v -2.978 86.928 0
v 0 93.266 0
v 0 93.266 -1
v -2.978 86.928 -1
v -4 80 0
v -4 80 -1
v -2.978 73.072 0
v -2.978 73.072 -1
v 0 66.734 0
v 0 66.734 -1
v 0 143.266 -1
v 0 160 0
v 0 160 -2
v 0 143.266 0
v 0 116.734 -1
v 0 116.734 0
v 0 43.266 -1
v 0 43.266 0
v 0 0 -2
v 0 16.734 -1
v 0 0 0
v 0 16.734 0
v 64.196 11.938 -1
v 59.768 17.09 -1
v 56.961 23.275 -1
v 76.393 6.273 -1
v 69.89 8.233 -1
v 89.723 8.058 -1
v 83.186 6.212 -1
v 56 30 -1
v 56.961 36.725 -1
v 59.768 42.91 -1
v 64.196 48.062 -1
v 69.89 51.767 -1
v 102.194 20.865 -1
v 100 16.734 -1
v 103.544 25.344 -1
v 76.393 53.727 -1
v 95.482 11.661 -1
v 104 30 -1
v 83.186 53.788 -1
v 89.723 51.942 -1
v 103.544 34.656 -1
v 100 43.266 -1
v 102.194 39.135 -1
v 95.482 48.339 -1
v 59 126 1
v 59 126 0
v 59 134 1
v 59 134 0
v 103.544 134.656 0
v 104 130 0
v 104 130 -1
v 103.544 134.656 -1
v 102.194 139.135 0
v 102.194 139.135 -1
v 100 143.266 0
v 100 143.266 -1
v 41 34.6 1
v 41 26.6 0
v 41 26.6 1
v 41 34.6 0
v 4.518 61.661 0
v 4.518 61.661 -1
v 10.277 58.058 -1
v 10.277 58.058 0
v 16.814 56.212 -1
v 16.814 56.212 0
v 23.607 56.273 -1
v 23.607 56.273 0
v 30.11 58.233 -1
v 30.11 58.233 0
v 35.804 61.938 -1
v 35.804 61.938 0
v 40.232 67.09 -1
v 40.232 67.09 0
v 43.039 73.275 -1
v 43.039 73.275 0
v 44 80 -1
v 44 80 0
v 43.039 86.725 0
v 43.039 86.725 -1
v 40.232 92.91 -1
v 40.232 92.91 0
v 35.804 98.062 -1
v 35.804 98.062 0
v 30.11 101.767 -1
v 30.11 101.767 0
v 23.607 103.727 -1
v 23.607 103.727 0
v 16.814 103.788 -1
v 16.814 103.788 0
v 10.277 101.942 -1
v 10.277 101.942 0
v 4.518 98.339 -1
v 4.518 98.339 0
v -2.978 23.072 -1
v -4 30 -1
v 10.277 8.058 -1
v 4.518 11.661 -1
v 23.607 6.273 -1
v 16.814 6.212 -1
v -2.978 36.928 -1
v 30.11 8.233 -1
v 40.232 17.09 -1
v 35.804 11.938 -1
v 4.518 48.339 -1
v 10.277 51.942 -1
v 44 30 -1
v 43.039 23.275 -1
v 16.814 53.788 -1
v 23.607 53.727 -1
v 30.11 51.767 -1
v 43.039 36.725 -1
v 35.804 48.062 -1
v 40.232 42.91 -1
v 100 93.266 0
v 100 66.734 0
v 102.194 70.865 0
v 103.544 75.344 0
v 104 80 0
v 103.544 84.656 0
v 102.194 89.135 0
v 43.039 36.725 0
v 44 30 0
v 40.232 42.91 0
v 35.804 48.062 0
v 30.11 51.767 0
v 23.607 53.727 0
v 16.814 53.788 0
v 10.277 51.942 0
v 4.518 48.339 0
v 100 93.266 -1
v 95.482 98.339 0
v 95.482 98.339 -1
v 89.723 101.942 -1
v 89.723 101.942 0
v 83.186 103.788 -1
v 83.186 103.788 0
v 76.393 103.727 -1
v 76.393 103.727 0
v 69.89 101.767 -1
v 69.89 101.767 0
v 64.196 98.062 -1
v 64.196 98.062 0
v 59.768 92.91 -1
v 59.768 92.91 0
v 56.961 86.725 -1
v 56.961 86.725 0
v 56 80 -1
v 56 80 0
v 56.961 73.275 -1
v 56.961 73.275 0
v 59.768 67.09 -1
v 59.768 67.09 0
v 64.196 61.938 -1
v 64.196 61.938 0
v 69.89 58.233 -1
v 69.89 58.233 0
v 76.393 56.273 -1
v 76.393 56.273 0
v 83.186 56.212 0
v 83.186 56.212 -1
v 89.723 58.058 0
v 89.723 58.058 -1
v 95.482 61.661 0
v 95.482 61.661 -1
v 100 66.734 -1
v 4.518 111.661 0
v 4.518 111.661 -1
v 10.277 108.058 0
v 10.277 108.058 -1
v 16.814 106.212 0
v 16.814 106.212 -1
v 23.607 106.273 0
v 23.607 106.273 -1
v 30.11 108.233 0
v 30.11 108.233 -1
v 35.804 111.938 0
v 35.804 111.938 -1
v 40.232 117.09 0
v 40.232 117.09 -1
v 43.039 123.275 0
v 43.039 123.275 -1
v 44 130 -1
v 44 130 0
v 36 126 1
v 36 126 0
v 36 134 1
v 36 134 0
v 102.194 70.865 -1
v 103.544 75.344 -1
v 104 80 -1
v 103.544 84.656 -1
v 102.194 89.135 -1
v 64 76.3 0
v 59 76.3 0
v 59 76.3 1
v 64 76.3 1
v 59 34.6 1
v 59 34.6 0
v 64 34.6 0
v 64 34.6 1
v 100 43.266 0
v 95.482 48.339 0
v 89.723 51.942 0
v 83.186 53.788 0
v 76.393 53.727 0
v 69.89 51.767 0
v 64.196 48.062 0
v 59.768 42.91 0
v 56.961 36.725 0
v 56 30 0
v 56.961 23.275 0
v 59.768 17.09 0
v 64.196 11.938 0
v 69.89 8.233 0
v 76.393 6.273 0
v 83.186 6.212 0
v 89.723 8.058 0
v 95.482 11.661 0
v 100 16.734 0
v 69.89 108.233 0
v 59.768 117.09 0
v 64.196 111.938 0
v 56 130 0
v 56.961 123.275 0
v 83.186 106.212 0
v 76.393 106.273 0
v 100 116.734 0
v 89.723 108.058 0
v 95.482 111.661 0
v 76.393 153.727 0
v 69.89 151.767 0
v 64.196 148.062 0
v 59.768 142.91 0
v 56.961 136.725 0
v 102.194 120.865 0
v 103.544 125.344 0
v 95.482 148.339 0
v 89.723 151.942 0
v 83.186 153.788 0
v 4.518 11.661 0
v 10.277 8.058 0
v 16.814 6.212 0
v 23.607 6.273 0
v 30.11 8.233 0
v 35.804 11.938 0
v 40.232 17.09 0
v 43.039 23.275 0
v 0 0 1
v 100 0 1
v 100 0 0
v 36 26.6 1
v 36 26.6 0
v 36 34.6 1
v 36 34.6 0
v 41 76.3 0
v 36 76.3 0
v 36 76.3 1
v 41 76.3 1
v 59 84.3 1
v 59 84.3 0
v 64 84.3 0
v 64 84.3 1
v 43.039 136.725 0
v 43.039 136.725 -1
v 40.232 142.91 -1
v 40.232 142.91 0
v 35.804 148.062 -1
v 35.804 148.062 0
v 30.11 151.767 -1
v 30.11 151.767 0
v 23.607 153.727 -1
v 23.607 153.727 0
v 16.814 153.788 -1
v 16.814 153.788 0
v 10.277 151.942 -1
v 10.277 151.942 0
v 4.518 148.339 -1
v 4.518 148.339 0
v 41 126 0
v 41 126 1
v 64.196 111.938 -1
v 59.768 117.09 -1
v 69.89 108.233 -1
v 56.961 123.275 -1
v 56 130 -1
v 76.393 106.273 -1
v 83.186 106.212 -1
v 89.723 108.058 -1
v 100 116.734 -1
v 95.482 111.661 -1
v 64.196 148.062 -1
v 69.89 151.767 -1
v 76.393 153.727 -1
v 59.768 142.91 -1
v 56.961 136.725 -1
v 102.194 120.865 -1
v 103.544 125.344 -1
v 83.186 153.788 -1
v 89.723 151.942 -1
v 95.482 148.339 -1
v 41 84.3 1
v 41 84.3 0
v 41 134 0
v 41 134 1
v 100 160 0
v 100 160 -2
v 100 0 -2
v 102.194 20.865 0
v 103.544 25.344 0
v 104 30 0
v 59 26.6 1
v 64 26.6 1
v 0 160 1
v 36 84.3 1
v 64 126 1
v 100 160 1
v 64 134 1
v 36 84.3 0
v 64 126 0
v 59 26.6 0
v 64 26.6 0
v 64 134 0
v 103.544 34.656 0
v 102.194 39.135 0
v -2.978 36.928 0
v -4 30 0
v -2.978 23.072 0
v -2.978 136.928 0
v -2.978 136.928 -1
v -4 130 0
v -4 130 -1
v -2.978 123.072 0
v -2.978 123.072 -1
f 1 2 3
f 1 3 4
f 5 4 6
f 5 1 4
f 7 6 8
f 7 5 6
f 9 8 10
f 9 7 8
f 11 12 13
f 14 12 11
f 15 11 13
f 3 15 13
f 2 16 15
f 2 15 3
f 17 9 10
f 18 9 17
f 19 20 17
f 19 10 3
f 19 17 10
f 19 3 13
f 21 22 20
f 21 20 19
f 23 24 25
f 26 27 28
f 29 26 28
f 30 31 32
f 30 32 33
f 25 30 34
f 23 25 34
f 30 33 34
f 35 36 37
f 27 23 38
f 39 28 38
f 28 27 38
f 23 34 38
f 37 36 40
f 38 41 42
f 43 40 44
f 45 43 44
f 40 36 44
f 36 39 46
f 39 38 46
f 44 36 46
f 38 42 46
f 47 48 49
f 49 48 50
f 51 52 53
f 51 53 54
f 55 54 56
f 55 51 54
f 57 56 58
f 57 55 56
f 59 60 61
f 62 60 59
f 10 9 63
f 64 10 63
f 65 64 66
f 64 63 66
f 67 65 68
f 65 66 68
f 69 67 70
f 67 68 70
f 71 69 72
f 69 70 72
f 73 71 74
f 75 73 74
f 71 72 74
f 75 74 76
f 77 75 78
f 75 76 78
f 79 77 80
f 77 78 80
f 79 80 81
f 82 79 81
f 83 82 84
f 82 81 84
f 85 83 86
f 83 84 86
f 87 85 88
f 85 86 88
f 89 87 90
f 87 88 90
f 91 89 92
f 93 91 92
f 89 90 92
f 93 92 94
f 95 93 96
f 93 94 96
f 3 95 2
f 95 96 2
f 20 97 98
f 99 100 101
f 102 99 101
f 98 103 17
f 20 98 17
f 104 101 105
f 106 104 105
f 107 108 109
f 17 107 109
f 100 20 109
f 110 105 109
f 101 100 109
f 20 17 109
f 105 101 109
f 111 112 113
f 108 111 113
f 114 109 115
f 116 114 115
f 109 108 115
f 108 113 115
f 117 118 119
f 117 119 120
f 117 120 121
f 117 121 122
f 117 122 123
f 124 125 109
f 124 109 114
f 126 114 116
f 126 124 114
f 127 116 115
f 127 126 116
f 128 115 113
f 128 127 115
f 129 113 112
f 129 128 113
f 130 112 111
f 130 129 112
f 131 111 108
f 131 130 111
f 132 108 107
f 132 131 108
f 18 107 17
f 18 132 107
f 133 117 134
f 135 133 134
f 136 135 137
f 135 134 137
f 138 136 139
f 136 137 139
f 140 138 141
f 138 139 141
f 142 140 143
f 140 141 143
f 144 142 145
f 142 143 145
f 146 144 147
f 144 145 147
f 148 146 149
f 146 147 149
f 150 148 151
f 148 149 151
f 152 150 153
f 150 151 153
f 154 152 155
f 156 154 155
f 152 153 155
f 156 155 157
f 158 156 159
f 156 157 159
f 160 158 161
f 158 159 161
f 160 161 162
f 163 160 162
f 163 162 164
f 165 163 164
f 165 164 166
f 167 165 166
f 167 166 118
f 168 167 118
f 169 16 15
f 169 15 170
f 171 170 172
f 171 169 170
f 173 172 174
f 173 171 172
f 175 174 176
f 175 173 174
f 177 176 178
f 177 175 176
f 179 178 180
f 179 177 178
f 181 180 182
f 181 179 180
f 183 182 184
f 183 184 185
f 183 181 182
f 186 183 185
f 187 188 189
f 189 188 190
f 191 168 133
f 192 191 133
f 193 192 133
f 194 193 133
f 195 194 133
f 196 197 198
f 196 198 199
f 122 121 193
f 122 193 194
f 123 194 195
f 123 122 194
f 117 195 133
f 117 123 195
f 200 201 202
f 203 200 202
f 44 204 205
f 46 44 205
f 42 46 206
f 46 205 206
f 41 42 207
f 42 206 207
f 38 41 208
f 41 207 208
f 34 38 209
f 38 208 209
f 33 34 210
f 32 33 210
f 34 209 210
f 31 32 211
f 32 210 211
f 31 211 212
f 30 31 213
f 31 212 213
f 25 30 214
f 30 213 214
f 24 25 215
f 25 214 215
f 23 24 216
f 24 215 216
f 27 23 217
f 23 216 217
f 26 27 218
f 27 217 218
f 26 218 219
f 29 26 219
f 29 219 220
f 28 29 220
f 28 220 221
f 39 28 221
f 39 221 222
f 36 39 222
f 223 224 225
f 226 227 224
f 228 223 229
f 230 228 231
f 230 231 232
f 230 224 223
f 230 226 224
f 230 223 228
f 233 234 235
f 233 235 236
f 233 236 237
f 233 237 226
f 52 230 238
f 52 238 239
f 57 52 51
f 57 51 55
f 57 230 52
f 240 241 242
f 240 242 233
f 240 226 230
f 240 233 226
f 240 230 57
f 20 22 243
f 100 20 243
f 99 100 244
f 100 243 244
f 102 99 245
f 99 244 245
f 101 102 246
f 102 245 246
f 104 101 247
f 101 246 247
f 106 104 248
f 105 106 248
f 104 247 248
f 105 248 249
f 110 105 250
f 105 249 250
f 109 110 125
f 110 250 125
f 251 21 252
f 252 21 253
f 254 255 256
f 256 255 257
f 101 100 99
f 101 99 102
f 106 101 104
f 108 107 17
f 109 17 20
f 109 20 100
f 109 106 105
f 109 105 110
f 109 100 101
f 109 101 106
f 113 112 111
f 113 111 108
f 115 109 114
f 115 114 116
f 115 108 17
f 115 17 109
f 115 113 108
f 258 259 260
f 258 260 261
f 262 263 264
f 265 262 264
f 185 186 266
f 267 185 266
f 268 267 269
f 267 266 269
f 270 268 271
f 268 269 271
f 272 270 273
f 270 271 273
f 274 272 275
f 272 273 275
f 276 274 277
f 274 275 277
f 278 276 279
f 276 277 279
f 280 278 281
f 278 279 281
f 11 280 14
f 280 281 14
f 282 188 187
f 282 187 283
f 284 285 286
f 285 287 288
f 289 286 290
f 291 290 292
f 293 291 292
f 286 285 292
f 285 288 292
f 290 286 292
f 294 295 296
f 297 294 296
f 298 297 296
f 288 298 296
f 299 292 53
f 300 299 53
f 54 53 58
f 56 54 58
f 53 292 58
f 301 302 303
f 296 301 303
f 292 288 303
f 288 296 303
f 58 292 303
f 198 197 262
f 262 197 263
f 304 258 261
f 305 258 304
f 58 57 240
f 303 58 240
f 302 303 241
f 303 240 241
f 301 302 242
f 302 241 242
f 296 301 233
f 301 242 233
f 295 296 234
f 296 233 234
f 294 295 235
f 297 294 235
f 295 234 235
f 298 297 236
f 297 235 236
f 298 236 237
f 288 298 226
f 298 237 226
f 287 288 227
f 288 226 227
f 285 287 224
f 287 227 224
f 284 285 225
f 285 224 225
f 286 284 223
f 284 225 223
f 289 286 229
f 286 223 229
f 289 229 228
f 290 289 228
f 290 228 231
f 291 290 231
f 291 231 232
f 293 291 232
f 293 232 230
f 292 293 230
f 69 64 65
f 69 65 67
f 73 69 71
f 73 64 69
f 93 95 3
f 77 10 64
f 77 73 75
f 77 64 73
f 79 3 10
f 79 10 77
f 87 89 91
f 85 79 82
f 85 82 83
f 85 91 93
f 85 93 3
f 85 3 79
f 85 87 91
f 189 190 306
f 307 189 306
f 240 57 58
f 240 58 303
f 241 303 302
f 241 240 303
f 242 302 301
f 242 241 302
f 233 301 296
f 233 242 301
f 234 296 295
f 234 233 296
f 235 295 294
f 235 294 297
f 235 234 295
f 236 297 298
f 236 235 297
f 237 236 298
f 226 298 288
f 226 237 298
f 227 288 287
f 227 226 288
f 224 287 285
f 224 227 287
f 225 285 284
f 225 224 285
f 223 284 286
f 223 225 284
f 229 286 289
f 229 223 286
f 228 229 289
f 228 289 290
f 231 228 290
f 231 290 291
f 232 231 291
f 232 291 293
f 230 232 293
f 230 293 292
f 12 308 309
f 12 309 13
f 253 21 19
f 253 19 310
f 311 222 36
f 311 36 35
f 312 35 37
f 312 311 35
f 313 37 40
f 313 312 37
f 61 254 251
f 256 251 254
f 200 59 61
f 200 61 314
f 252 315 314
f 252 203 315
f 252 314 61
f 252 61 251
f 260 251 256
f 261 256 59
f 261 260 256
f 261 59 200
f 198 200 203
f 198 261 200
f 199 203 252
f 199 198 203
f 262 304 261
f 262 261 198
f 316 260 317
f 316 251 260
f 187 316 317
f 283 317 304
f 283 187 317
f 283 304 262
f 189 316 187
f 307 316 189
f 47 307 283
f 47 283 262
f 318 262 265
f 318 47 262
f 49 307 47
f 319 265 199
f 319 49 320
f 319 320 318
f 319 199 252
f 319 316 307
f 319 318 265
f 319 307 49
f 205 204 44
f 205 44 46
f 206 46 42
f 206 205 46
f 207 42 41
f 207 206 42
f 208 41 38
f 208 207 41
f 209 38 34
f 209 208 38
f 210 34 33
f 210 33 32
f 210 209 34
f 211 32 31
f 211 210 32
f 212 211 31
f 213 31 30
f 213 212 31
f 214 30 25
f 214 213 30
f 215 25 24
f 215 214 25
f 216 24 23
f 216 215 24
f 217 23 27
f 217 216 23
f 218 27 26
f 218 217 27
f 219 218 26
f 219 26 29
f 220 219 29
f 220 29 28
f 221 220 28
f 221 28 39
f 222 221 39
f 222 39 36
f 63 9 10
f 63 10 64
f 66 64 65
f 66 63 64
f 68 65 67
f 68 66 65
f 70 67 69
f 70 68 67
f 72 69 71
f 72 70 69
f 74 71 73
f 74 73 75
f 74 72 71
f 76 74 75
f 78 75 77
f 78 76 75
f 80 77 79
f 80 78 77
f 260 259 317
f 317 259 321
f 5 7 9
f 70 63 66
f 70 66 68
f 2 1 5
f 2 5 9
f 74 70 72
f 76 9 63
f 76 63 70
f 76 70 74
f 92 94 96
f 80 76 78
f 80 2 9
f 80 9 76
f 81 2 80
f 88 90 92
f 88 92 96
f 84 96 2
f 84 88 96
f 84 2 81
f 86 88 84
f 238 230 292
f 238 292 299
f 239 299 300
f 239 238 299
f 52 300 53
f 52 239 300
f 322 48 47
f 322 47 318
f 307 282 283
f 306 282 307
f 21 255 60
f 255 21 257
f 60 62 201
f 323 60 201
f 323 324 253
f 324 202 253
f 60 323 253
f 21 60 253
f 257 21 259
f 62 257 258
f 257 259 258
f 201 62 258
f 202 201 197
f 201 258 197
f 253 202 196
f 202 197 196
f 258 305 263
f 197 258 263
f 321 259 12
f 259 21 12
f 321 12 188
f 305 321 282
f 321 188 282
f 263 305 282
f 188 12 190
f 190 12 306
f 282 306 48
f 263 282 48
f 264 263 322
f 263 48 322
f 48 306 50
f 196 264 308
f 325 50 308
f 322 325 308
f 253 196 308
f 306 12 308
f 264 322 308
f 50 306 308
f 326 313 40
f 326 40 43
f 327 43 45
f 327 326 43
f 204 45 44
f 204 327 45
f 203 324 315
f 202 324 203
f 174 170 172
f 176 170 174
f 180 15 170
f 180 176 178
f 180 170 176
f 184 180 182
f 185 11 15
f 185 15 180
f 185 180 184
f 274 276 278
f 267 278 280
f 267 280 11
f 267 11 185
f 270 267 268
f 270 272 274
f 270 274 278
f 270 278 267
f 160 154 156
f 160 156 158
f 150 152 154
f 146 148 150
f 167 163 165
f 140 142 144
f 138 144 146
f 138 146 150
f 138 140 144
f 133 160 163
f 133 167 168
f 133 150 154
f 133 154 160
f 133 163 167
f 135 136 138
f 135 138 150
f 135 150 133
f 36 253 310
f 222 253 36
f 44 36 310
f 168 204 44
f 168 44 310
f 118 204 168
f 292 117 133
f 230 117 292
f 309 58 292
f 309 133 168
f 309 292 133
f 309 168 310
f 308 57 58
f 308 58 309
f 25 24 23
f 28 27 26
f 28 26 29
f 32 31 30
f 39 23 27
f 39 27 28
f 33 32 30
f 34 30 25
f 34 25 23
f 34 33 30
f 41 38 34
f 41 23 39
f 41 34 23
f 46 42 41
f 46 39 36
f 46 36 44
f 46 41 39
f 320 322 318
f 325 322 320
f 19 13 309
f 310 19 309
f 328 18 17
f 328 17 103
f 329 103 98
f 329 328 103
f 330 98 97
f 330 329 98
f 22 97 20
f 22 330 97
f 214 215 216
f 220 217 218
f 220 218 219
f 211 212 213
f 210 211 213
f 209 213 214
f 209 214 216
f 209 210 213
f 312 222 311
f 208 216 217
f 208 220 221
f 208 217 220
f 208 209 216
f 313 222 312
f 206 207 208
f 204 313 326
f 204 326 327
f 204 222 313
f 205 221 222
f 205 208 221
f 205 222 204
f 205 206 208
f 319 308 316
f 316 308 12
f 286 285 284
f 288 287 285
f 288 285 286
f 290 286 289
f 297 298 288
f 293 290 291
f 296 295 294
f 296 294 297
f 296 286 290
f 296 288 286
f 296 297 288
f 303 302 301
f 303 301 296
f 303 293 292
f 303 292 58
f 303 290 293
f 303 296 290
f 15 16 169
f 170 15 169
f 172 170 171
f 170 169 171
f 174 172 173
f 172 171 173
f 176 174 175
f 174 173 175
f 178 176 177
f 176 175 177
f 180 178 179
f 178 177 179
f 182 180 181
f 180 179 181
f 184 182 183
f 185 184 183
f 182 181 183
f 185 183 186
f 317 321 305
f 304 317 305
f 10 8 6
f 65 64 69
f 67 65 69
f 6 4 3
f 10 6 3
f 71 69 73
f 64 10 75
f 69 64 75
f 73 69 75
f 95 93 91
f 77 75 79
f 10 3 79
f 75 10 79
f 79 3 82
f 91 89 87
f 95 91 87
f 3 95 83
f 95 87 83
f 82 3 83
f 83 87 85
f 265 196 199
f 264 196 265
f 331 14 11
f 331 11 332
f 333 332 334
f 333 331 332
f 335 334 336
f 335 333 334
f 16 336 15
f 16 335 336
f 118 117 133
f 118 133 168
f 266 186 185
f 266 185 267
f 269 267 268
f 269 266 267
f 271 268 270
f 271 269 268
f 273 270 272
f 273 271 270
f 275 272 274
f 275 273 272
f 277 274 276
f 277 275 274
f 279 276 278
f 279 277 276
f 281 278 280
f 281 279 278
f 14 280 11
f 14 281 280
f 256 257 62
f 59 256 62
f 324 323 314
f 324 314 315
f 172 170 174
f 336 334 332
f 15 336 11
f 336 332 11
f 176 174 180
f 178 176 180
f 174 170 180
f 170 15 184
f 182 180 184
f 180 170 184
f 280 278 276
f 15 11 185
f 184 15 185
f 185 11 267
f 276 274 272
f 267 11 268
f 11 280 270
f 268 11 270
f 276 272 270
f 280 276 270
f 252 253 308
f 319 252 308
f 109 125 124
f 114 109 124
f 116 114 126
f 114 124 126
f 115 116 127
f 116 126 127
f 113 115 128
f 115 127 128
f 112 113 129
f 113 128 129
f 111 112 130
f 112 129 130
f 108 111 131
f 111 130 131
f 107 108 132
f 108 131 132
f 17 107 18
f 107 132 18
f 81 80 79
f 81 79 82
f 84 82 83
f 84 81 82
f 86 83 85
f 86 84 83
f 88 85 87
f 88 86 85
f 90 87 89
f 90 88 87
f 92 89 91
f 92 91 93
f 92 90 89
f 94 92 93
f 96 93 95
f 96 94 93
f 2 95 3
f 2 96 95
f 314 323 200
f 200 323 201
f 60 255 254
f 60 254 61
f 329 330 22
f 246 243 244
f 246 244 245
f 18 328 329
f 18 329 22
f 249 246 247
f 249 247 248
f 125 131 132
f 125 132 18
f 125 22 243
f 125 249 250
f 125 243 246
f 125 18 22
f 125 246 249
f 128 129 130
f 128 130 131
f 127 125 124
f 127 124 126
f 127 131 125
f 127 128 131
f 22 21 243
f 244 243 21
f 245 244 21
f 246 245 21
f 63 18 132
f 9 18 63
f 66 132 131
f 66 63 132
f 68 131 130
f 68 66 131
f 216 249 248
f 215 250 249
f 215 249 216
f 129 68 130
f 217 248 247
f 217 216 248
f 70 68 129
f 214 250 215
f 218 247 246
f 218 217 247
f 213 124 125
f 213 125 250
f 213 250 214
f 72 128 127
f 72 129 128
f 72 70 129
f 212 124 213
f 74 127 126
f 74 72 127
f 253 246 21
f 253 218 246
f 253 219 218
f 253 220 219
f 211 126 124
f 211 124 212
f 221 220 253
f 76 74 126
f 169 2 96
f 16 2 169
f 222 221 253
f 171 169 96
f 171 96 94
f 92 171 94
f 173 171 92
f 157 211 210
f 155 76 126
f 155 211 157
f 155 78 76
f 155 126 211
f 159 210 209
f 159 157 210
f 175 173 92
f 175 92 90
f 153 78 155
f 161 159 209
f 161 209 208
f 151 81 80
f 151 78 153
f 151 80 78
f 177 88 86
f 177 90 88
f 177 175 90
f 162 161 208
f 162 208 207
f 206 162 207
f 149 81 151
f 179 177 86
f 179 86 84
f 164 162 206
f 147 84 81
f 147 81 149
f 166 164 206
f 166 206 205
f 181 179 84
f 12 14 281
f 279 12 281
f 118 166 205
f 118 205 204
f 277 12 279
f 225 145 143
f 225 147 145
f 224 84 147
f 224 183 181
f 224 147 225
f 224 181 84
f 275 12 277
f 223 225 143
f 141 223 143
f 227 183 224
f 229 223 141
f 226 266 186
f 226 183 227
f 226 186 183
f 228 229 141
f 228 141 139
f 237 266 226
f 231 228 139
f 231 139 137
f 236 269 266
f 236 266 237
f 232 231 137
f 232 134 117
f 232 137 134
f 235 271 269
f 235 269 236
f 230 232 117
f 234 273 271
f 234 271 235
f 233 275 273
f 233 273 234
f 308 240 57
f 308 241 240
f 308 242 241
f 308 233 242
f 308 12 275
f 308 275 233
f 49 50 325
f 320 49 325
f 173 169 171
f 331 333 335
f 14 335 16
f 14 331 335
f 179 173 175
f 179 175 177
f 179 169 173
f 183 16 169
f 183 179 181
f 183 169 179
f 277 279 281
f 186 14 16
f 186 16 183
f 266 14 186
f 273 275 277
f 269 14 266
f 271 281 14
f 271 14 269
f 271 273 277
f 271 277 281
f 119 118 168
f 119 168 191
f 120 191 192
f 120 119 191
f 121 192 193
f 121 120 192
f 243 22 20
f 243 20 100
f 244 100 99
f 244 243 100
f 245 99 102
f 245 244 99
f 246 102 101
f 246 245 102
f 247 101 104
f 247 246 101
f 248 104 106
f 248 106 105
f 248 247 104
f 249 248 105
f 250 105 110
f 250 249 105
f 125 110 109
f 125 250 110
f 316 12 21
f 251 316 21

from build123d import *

# Parameters (mm, degrees)
F0_W     = 5
F0_H     = 8
F1_DEPTH = 2
F2_DEPTH = 1
F3_DEPTH = 1
F4_DEPTH = 1


with BuildPart() as f1:
    # F0 (on Top) → F1 (new body)
    with BuildSketch(Plane.XY):
        with BuildLine():
            ThreePointArc((100, 143.2664991614), (56, 130), (100, 116.7335008386))
            Line((100, 116.7335008386), (100, 143.2664991614))
        make_face()
        with Locations((61.5, 130)):
            Rectangle(F0_W, F0_H, mode=Mode.SUBTRACT)
        with BuildLine():
            Line((0, 16.7335008386), (0, 0))
            Line((0, 0), (100, 0))
            Line((100, 0), (100, 16.7335008386))
            ThreePointArc((100, 16.7335008386), (56, 30), (100, 43.2664991614))
            Line((100, 43.2664991614), (100, 66.7335008386))
            ThreePointArc((100, 66.7335008386), (56, 80), (100, 93.2664991614))
            Line((100, 93.2664991614), (100, 116.7335008386))
            ThreePointArc((100, 116.7335008386), (56, 130), (100, 143.2664991614))
            Line((100, 143.2664991614), (100, 160))
            Line((100, 160), (0, 160))
            Line((0, 160), (0, 143.2664991614))
            ThreePointArc((0, 143.2664991614), (26.9282032303, 152.9782505862), (44, 130))
            ThreePointArc((44, 130), (26.9282032303, 107.0217494138), (0, 116.7335008386))
            Line((0, 116.7335008386), (0, 93.2664991614))
            ThreePointArc((0, 93.2664991614), (26.9282032303, 102.9782505862), (44, 80))
            ThreePointArc((44, 80), (26.9282032303, 57.0217494138), (0, 66.7335008386))
            Line((0, 66.7335008386), (0, 43.2664991614))
            ThreePointArc((0, 43.2664991614), (26.9282032303, 52.9782505862), (44, 30))
            ThreePointArc((44, 30), (26.9282032303, 7.0217494138), (0, 16.7335008386))
        make_face()
        with BuildLine():
            ThreePointArc((100, 43.2664991614), (56, 30), (100, 16.7335008386))
            Line((100, 16.7335008386), (100, 43.2664991614))
        make_face()
        with Locations((61.5, 30.6)):
            Rectangle(F0_W, F0_H, mode=Mode.SUBTRACT)
        with BuildLine():
            Line((0, 93.2664991614), (0, 66.7335008386))
            ThreePointArc((0, 66.7335008386), (26.9282032303, 57.0217494138), (44, 80))
            ThreePointArc((44, 80), (26.9282032303, 102.9782505862), (0, 93.2664991614))
        make_face()
        with Locations((38.5, 80.3)):
            Rectangle(F0_W, F0_H, mode=Mode.SUBTRACT)
        with BuildLine():
            ThreePointArc((100, 93.2664991614), (56, 80), (100, 66.7335008386))
            Line((100, 66.7335008386), (100, 93.2664991614))
        make_face()
        with Locations((61.5, 80.3)):
            Rectangle(F0_W, F0_H, mode=Mode.SUBTRACT)
        with BuildLine():
            Line((0, 43.2664991614), (0, 16.7335008386))
            ThreePointArc((0, 16.7335008386), (26.9282032303, 7.0217494138), (44, 30))
            ThreePointArc((44, 30), (26.9282032303, 52.9782505862), (0, 43.2664991614))
        make_face()
        with Locations((38.5, 30.6)):
            Rectangle(F0_W, F0_H, mode=Mode.SUBTRACT)
        with BuildLine():
            Line((0, 143.2664991614), (0, 116.7335008386))
            ThreePointArc((0, 116.7335008386), (26.9282032303, 107.0217494138), (44, 130))
            ThreePointArc((44, 130), (26.9282032303, 152.9782505862), (0, 143.2664991614))
        make_face()
        with Locations((38.5, 130)):
            Rectangle(F0_W, F0_H, mode=Mode.SUBTRACT)
        with Locations((38.5, 80.3)):
            Rectangle(F0_W, F0_H)
        with Locations((38.5, 130)):
            Rectangle(F0_W, F0_H)
        with Locations((61.5, 130)):
            Rectangle(F0_W, F0_H)
        with Locations((61.5, 80.3)):
            Rectangle(F0_W, F0_H)
        with Locations((38.5, 30.6)):
            Rectangle(F0_W, F0_H)
        with Locations((61.5, 30.6)):
            Rectangle(F0_W, F0_H)
    extrude(amount=-F1_DEPTH)

    # F0 (on Top) → F2 (cut)
    with BuildSketch(Plane.XY):
        with BuildLine():
            Line((0, 143.2664991614), (0, 116.7335008386))
            ThreePointArc((0, 116.7335008386), (26.9282032303, 107.0217494138), (44, 130))
            ThreePointArc((44, 130), (26.9282032303, 152.9782505862), (0, 143.2664991614))
        make_face()
        with Locations((38.5, 130)):
            Rectangle(F0_W, F0_H, mode=Mode.SUBTRACT)
        with Locations((38.5, 130)):
            Rectangle(F0_W, F0_H)
        with BuildLine():
            ThreePointArc((100, 143.2664991614), (56, 130), (100, 116.7335008386))
            Line((100, 116.7335008386), (100, 143.2664991614))
        make_face()
        with Locations((61.5, 130)):
            Rectangle(F0_W, F0_H, mode=Mode.SUBTRACT)
        with Locations((61.5, 130)):
            Rectangle(F0_W, F0_H)
        with BuildLine():
            Line((0, 93.2664991614), (0, 66.7335008386))
            ThreePointArc((0, 66.7335008386), (26.9282032303, 57.0217494138), (44, 80))
            ThreePointArc((44, 80), (26.9282032303, 102.9782505862), (0, 93.2664991614))
        make_face()
        with Locations((38.5, 80.3)):
            Rectangle(F0_W, F0_H, mode=Mode.SUBTRACT)
        with Locations((38.5, 80.3)):
            Rectangle(F0_W, F0_H)
        with BuildLine():
            ThreePointArc((100, 93.2664991614), (56, 80), (100, 66.7335008386))
            Line((100, 66.7335008386), (100, 93.2664991614))
        make_face()
        with Locations((61.5, 80.3)):
            Rectangle(F0_W, F0_H, mode=Mode.SUBTRACT)
        with Locations((61.5, 80.3)):
            Rectangle(F0_W, F0_H)
        with BuildLine():
            Line((0, 43.2664991614), (0, 16.7335008386))
            ThreePointArc((0, 16.7335008386), (26.9282032303, 7.0217494138), (44, 30))
            ThreePointArc((44, 30), (26.9282032303, 52.9782505862), (0, 43.2664991614))
        make_face()
        with Locations((38.5, 30.6)):
            Rectangle(F0_W, F0_H, mode=Mode.SUBTRACT)
        with BuildLine():
            ThreePointArc((100, 43.2664991614), (56, 30), (100, 16.7335008386))
            Line((100, 16.7335008386), (100, 43.2664991614))
        make_face()
        with Locations((61.5, 30.6)):
            Rectangle(F0_W, F0_H, mode=Mode.SUBTRACT)
        with Locations((38.5, 30.6)):
            Rectangle(F0_W, F0_H)
        with Locations((61.5, 30.6)):
            Rectangle(F0_W, F0_H)
    extrude(amount=-F2_DEPTH, mode=Mode.SUBTRACT)


with BuildPart() as f3:
    # F0 (on Top) → F3 (new body)
    with BuildSketch(Plane.XY):
        with BuildLine():
            Line((0, 143.2664991614), (0, 116.7335008386))
            ThreePointArc((0, 116.7335008386), (26.9282032303, 107.0217494138), (44, 130))
            ThreePointArc((44, 130), (26.9282032303, 152.9782505862), (0, 143.2664991614))
        make_face()
        with Locations((38.5, 130)):
            Rectangle(F0_W, F0_H, mode=Mode.SUBTRACT)
        with BuildLine():
            ThreePointArc((0, 143.2664991614), (-4, 130), (0, 116.7335008386))
            Line((0, 116.7335008386), (0, 143.2664991614))
        make_face()
        with Locations((38.5, 130)):
            Rectangle(F0_W, F0_H)
    extrude(amount=-F3_DEPTH)


with BuildPart() as f3b:
    # F0 (on Top) → F3, piece 2 (new body)
    with BuildSketch(Plane.XY):
        with BuildLine():
            ThreePointArc((100, 143.2664991614), (56, 130), (100, 116.7335008386))
            Line((100, 116.7335008386), (100, 143.2664991614))
        make_face()
        with Locations((61.5, 130)):
            Rectangle(F0_W, F0_H, mode=Mode.SUBTRACT)
        with BuildLine():
            Line((100, 143.2664991614), (100, 116.7335008386))
            ThreePointArc((100, 116.7335008386), (102.9782505862, 123.0717967697), (104, 130))
            ThreePointArc((104, 130), (102.9782505862, 136.9282032303), (100, 143.2664991614))
        make_face()
        with Locations((61.5, 130)):
            Rectangle(F0_W, F0_H)
    extrude(amount=-F3_DEPTH)


with BuildPart() as f3c:
    # F0 (on Top) → F3, piece 3 (new body)
    with BuildSketch(Plane.XY):
        with BuildLine():
            Line((100, 93.2664991614), (100, 66.7335008386))
            ThreePointArc((100, 66.7335008386), (102.9782505862, 73.0717967697), (104, 80))
            ThreePointArc((104, 80), (102.9782505862, 86.9282032303), (100, 93.2664991614))
        make_face()
    extrude(amount=-F3_DEPTH)


with BuildPart() as f3d:
    # F0 (on Top) → F3, piece 4 (new body)
    with BuildSketch(Plane.XY):
        with BuildLine():
            ThreePointArc((100, 43.2664991614), (56, 30), (100, 16.7335008386))
            Line((100, 16.7335008386), (100, 43.2664991614))
        make_face()
        with Locations((61.5, 30.6)):
            Rectangle(F0_W, F0_H, mode=Mode.SUBTRACT)
        with BuildLine():
            Line((100, 43.2664991614), (100, 16.7335008386))
            ThreePointArc((100, 16.7335008386), (102.9782505862, 23.0717967697), (104, 30))
            ThreePointArc((104, 30), (102.9782505862, 36.9282032303), (100, 43.2664991614))
        make_face()
        with Locations((61.5, 30.6)):
            Rectangle(F0_W, F0_H)
    extrude(amount=-F3_DEPTH)


with BuildPart() as f3e:
    # F0 (on Top) → F3, piece 5 (new body)
    with BuildSketch(Plane.XY):
        with BuildLine():
            Line((0, 43.2664991614), (0, 16.7335008386))
            ThreePointArc((0, 16.7335008386), (26.9282032303, 7.0217494138), (44, 30))
            ThreePointArc((44, 30), (26.9282032303, 52.9782505862), (0, 43.2664991614))
        make_face()
        with Locations((38.5, 30.6)):
            Rectangle(F0_W, F0_H, mode=Mode.SUBTRACT)
        with BuildLine():
            ThreePointArc((0, 43.2664991614), (-4, 30), (0, 16.7335008386))
            Line((0, 16.7335008386), (0, 43.2664991614))
        make_face()
        with Locations((38.5, 30.6)):
            Rectangle(F0_W, F0_H)
    extrude(amount=-F3_DEPTH)


with BuildPart() as f3f:
    # F0 (on Top) → F3, piece 6 (new body)
    with BuildSketch(Plane.XY):
        with BuildLine():
            ThreePointArc((0, 93.2664991614), (-4, 80), (0, 66.7335008386))
            Line((0, 66.7335008386), (0, 93.2664991614))
        make_face()
        with BuildLine():
            Line((0, 93.2664991614), (0, 66.7335008386))
            ThreePointArc((0, 66.7335008386), (26.9282032303, 57.0217494138), (44, 80))
            ThreePointArc((44, 80), (26.9282032303, 102.9782505862), (0, 93.2664991614))
        make_face()
        with Locations((38.5, 80.3)):
            Rectangle(F0_W, F0_H, mode=Mode.SUBTRACT)
        with Locations((38.5, 80.3)):
            Rectangle(F0_W, F0_H)
    extrude(amount=-F3_DEPTH)


with BuildPart() as f4:
    # F0 (on Top) → F4 (new body)
    with BuildSketch(Plane.XY):
        with BuildLine():
            Line((0, 16.7335008386), (0, 0))
            Line((0, 0), (100, 0))
            Line((100, 0), (100, 16.7335008386))
            ThreePointArc((100, 16.7335008386), (56, 30), (100, 43.2664991614))
            Line((100, 43.2664991614), (100, 66.7335008386))
            ThreePointArc((100, 66.7335008386), (56, 80), (100, 93.2664991614))
            Line((100, 93.2664991614), (100, 116.7335008386))
            ThreePointArc((100, 116.7335008386), (56, 130), (100, 143.2664991614))
            Line((100, 143.2664991614), (100, 160))
            Line((100, 160), (0, 160))
            Line((0, 160), (0, 143.2664991614))
            ThreePointArc((0, 143.2664991614), (26.9282032303, 152.9782505862), (44, 130))
            ThreePointArc((44, 130), (26.9282032303, 107.0217494138), (0, 116.7335008386))
            Line((0, 116.7335008386), (0, 93.2664991614))
            ThreePointArc((0, 93.2664991614), (26.9282032303, 102.9782505862), (44, 80))
            ThreePointArc((44, 80), (26.9282032303, 57.0217494138), (0, 66.7335008386))
            Line((0, 66.7335008386), (0, 43.2664991614))
            ThreePointArc((0, 43.2664991614), (26.9282032303, 52.9782505862), (44, 30))
            ThreePointArc((44, 30), (26.9282032303, 7.0217494138), (0, 16.7335008386))
        make_face()
        with BuildLine():
            Line((0, 143.2664991614), (0, 116.7335008386))
            ThreePointArc((0, 116.7335008386), (26.9282032303, 107.0217494138), (44, 130))
            ThreePointArc((44, 130), (26.9282032303, 152.9782505862), (0, 143.2664991614))
        make_face()
        with Locations((38.5, 130)):
            Rectangle(F0_W, F0_H, mode=Mode.SUBTRACT)
        with BuildLine():
            ThreePointArc((100, 143.2664991614), (56, 130), (100, 116.7335008386))
            Line((100, 116.7335008386), (100, 143.2664991614))
        make_face()
        with Locations((61.5, 130)):
            Rectangle(F0_W, F0_H, mode=Mode.SUBTRACT)
        with BuildLine():
            ThreePointArc((100, 93.2664991614), (56, 80), (100, 66.7335008386))
            Line((100, 66.7335008386), (100, 93.2664991614))
        make_face()
        with Locations((61.5, 80.3)):
            Rectangle(F0_W, F0_H, mode=Mode.SUBTRACT)
        with BuildLine():
            Line((0, 93.2664991614), (0, 66.7335008386))
            ThreePointArc((0, 66.7335008386), (26.9282032303, 57.0217494138), (44, 80))
            ThreePointArc((44, 80), (26.9282032303, 102.9782505862), (0, 93.2664991614))
        make_face()
        with Locations((38.5, 80.3)):
            Rectangle(F0_W, F0_H, mode=Mode.SUBTRACT)
        with BuildLine():
            Line((0, 43.2664991614), (0, 16.7335008386))
            ThreePointArc((0, 16.7335008386), (26.9282032303, 7.0217494138), (44, 30))
            ThreePointArc((44, 30), (26.9282032303, 52.9782505862), (0, 43.2664991614))
        make_face()
        with Locations((38.5, 30.6)):
            Rectangle(F0_W, F0_H, mode=Mode.SUBTRACT)
        with BuildLine():
            ThreePointArc((100, 43.2664991614), (56, 30), (100, 16.7335008386))
            Line((100, 16.7335008386), (100, 43.2664991614))
        make_face()
        with Locations((61.5, 30.6)):
            Rectangle(F0_W, F0_H, mode=Mode.SUBTRACT)
    extrude(amount=F4_DEPTH)


solid = Compound([f1.part, f3.part, f3b.part, f3c.part, f3d.part, f3e.part, f3f.part, f4.part])
